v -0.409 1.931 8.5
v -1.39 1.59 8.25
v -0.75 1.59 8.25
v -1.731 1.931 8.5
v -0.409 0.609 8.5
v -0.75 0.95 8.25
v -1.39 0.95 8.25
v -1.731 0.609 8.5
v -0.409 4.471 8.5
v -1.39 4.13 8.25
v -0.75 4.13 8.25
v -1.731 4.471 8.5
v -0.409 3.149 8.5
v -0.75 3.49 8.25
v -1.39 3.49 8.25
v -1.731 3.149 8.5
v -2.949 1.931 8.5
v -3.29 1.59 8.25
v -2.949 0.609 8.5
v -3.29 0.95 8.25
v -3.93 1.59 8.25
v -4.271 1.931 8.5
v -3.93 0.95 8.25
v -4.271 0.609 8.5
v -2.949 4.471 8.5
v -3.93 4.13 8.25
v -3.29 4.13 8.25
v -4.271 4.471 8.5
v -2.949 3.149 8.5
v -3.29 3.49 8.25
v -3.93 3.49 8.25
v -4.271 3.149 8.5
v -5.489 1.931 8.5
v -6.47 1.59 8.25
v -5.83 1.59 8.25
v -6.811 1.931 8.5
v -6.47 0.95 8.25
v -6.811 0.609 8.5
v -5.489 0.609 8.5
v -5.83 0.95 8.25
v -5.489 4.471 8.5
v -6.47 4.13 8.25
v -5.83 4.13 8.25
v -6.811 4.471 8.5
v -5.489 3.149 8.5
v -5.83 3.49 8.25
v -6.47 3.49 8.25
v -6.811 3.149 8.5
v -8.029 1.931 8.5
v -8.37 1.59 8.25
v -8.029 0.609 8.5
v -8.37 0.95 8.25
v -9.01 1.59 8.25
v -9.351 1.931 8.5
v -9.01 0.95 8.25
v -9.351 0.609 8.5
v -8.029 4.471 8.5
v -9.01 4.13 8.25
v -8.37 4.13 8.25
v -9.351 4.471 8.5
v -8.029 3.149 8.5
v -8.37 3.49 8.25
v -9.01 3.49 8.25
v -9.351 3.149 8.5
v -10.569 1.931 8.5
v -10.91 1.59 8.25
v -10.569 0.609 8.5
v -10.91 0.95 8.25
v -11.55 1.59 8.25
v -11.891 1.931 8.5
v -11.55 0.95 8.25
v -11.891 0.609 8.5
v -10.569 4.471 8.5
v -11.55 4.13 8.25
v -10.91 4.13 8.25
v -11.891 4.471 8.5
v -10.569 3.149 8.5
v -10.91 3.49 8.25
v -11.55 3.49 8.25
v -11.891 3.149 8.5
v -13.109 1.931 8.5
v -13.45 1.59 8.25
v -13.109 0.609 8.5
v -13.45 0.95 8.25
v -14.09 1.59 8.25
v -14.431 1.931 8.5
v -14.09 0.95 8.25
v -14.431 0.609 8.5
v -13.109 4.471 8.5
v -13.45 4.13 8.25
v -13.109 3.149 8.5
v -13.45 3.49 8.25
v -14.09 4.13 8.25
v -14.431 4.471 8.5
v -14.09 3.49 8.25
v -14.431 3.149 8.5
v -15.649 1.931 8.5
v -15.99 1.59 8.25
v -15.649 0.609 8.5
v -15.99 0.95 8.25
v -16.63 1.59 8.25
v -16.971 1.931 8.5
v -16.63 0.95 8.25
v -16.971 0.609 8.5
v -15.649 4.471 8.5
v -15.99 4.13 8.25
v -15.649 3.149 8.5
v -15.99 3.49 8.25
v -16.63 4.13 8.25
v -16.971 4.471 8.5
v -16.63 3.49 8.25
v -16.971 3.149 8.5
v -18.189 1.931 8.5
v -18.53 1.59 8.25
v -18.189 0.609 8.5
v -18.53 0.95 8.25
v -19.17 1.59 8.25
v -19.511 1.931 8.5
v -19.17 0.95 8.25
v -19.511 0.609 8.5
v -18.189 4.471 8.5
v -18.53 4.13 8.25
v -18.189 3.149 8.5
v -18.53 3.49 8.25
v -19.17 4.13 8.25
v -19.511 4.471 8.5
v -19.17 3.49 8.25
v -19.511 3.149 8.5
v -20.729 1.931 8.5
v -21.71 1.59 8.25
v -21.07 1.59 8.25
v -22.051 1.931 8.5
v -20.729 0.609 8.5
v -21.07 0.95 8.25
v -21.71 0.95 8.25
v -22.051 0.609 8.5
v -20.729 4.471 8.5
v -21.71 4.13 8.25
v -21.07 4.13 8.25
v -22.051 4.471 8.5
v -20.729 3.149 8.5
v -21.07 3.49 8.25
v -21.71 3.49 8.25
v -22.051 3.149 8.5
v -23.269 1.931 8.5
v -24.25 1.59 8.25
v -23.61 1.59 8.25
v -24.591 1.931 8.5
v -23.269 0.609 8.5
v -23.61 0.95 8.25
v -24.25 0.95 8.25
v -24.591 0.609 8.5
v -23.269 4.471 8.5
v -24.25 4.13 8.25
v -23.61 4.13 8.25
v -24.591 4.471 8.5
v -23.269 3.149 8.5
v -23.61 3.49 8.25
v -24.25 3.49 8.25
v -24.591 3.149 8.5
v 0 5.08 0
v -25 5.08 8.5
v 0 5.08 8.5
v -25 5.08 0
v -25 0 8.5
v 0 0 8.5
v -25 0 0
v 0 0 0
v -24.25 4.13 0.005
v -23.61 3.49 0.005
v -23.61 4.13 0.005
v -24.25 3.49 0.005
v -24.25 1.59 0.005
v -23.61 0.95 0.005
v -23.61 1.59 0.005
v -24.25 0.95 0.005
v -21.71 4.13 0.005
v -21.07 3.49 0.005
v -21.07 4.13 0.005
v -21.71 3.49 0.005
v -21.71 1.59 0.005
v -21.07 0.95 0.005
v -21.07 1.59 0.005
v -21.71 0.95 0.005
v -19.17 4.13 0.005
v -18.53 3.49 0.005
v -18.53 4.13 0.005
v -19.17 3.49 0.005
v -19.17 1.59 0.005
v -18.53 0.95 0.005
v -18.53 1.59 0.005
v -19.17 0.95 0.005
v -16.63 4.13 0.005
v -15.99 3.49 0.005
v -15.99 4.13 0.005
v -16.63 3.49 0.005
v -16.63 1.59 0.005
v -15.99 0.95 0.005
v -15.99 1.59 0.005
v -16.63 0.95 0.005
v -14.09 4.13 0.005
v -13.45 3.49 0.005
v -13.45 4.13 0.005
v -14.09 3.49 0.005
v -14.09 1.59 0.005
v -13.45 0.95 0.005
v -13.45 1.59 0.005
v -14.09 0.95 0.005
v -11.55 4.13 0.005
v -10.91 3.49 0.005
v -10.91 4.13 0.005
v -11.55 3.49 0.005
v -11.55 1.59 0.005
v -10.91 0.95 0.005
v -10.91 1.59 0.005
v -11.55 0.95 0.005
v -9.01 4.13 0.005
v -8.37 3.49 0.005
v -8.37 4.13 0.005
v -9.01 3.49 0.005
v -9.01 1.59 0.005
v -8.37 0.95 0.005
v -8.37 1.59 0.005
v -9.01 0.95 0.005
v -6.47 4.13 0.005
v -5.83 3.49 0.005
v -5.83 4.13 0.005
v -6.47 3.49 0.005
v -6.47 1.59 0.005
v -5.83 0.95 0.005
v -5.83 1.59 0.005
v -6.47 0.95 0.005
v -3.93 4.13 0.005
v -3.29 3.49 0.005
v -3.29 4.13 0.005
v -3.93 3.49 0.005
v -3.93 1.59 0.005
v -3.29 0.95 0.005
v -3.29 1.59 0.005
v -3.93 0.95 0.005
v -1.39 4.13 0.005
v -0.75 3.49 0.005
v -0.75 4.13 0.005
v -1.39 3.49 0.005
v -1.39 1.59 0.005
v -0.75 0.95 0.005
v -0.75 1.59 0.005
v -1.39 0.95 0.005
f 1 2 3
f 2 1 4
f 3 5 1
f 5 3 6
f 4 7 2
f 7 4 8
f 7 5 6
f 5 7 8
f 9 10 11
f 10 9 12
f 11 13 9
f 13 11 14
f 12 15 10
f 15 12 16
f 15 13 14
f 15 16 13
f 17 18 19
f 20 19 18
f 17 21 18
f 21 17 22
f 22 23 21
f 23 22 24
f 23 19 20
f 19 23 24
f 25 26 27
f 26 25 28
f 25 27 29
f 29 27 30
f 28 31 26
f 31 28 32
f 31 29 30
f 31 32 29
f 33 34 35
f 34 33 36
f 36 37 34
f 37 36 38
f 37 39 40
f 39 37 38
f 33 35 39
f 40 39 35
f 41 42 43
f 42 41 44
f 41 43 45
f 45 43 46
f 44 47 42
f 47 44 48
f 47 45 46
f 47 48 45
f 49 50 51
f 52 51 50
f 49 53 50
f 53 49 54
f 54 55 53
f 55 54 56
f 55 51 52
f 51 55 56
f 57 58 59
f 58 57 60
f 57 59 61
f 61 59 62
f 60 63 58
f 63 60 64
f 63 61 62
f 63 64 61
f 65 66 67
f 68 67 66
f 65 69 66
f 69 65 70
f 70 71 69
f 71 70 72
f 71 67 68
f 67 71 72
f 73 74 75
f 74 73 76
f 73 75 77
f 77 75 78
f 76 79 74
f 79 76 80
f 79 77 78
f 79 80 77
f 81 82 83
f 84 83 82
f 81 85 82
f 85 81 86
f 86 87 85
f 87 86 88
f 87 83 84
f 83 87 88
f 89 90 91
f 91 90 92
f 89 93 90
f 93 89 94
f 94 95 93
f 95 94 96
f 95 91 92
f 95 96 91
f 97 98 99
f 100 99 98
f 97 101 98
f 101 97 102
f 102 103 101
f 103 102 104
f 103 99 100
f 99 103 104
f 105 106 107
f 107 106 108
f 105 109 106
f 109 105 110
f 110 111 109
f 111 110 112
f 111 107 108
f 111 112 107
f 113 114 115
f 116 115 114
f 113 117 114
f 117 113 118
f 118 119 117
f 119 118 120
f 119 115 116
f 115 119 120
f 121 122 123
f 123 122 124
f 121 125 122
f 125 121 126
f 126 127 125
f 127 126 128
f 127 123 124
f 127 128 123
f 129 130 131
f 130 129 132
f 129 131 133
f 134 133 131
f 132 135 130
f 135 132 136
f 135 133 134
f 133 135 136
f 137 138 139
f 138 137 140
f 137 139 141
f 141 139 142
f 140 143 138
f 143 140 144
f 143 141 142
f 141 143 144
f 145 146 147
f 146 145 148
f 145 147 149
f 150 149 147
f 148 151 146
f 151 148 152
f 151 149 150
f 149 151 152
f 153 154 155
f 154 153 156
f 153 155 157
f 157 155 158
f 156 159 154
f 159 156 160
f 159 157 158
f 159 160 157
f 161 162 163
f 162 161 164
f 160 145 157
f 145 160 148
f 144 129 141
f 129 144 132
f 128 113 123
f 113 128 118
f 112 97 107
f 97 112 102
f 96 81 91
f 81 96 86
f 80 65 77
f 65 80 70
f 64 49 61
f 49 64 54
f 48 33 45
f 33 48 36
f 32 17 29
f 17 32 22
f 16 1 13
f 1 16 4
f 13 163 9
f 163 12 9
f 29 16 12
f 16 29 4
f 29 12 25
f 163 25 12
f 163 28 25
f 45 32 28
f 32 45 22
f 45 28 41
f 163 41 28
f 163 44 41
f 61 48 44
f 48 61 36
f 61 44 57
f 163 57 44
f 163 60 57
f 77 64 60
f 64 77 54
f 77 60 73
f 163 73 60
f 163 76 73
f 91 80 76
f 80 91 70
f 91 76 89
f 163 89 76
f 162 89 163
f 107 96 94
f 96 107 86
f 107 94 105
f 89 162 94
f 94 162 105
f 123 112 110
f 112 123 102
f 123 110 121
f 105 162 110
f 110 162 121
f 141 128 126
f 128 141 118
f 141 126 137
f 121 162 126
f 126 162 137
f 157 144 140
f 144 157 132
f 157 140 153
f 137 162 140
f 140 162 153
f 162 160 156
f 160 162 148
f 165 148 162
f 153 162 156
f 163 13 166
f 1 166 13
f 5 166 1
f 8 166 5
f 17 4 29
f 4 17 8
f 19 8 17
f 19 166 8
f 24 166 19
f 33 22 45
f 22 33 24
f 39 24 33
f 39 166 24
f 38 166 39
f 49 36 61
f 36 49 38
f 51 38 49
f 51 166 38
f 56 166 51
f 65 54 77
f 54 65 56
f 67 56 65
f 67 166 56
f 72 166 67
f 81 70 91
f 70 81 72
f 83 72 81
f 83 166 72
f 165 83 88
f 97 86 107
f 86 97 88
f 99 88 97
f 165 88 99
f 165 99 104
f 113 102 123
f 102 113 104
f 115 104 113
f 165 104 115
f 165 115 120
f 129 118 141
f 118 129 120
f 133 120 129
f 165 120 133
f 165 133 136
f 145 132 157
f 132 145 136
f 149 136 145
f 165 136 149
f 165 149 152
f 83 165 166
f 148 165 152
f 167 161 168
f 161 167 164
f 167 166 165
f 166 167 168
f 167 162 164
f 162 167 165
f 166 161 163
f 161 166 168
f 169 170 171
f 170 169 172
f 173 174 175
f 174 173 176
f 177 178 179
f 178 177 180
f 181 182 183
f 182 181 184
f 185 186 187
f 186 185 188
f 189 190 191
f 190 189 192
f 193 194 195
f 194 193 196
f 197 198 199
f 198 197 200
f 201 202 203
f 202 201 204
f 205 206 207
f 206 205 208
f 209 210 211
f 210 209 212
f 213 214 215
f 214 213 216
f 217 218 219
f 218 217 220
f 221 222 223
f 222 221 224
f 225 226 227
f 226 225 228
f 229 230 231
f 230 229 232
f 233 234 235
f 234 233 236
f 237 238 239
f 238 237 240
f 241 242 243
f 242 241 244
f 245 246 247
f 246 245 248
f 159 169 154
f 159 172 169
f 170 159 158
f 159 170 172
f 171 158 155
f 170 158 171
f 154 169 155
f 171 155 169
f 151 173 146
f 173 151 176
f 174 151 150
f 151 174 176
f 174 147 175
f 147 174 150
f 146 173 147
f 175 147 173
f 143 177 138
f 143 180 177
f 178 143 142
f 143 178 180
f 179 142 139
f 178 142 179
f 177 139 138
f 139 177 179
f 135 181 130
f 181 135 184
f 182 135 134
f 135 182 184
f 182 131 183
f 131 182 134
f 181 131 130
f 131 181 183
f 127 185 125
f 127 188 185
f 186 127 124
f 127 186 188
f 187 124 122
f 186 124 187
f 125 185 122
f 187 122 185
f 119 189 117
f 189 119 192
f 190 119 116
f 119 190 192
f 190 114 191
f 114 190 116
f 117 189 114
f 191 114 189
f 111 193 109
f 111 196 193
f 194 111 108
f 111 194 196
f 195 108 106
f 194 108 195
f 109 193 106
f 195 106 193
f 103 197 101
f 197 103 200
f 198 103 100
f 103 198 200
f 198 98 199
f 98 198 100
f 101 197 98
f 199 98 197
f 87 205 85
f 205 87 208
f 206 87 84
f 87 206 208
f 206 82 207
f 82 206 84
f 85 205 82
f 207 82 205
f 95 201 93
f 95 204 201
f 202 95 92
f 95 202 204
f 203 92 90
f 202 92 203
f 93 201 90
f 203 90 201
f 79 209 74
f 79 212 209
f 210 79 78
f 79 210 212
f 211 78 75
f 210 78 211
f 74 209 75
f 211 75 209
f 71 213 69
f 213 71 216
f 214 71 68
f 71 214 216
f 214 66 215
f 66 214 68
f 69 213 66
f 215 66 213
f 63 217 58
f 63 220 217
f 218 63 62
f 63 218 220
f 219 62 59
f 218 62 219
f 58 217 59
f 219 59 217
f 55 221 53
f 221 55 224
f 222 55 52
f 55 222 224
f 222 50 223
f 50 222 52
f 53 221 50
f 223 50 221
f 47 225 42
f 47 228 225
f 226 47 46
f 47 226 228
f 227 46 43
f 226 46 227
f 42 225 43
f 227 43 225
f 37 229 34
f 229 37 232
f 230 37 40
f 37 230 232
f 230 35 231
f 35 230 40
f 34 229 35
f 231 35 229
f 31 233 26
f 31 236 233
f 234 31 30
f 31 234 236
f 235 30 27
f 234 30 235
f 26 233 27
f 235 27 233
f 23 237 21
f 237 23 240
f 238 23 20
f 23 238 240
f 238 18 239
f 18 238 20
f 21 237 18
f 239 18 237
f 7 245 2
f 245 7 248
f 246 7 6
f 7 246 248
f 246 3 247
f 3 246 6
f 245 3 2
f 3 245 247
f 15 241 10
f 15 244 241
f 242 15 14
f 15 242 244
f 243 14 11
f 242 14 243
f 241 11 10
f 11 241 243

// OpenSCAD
include <../../lib/device/component.scad>;

rotate([0,0,90]) female_header_pitch254(2, 10);
